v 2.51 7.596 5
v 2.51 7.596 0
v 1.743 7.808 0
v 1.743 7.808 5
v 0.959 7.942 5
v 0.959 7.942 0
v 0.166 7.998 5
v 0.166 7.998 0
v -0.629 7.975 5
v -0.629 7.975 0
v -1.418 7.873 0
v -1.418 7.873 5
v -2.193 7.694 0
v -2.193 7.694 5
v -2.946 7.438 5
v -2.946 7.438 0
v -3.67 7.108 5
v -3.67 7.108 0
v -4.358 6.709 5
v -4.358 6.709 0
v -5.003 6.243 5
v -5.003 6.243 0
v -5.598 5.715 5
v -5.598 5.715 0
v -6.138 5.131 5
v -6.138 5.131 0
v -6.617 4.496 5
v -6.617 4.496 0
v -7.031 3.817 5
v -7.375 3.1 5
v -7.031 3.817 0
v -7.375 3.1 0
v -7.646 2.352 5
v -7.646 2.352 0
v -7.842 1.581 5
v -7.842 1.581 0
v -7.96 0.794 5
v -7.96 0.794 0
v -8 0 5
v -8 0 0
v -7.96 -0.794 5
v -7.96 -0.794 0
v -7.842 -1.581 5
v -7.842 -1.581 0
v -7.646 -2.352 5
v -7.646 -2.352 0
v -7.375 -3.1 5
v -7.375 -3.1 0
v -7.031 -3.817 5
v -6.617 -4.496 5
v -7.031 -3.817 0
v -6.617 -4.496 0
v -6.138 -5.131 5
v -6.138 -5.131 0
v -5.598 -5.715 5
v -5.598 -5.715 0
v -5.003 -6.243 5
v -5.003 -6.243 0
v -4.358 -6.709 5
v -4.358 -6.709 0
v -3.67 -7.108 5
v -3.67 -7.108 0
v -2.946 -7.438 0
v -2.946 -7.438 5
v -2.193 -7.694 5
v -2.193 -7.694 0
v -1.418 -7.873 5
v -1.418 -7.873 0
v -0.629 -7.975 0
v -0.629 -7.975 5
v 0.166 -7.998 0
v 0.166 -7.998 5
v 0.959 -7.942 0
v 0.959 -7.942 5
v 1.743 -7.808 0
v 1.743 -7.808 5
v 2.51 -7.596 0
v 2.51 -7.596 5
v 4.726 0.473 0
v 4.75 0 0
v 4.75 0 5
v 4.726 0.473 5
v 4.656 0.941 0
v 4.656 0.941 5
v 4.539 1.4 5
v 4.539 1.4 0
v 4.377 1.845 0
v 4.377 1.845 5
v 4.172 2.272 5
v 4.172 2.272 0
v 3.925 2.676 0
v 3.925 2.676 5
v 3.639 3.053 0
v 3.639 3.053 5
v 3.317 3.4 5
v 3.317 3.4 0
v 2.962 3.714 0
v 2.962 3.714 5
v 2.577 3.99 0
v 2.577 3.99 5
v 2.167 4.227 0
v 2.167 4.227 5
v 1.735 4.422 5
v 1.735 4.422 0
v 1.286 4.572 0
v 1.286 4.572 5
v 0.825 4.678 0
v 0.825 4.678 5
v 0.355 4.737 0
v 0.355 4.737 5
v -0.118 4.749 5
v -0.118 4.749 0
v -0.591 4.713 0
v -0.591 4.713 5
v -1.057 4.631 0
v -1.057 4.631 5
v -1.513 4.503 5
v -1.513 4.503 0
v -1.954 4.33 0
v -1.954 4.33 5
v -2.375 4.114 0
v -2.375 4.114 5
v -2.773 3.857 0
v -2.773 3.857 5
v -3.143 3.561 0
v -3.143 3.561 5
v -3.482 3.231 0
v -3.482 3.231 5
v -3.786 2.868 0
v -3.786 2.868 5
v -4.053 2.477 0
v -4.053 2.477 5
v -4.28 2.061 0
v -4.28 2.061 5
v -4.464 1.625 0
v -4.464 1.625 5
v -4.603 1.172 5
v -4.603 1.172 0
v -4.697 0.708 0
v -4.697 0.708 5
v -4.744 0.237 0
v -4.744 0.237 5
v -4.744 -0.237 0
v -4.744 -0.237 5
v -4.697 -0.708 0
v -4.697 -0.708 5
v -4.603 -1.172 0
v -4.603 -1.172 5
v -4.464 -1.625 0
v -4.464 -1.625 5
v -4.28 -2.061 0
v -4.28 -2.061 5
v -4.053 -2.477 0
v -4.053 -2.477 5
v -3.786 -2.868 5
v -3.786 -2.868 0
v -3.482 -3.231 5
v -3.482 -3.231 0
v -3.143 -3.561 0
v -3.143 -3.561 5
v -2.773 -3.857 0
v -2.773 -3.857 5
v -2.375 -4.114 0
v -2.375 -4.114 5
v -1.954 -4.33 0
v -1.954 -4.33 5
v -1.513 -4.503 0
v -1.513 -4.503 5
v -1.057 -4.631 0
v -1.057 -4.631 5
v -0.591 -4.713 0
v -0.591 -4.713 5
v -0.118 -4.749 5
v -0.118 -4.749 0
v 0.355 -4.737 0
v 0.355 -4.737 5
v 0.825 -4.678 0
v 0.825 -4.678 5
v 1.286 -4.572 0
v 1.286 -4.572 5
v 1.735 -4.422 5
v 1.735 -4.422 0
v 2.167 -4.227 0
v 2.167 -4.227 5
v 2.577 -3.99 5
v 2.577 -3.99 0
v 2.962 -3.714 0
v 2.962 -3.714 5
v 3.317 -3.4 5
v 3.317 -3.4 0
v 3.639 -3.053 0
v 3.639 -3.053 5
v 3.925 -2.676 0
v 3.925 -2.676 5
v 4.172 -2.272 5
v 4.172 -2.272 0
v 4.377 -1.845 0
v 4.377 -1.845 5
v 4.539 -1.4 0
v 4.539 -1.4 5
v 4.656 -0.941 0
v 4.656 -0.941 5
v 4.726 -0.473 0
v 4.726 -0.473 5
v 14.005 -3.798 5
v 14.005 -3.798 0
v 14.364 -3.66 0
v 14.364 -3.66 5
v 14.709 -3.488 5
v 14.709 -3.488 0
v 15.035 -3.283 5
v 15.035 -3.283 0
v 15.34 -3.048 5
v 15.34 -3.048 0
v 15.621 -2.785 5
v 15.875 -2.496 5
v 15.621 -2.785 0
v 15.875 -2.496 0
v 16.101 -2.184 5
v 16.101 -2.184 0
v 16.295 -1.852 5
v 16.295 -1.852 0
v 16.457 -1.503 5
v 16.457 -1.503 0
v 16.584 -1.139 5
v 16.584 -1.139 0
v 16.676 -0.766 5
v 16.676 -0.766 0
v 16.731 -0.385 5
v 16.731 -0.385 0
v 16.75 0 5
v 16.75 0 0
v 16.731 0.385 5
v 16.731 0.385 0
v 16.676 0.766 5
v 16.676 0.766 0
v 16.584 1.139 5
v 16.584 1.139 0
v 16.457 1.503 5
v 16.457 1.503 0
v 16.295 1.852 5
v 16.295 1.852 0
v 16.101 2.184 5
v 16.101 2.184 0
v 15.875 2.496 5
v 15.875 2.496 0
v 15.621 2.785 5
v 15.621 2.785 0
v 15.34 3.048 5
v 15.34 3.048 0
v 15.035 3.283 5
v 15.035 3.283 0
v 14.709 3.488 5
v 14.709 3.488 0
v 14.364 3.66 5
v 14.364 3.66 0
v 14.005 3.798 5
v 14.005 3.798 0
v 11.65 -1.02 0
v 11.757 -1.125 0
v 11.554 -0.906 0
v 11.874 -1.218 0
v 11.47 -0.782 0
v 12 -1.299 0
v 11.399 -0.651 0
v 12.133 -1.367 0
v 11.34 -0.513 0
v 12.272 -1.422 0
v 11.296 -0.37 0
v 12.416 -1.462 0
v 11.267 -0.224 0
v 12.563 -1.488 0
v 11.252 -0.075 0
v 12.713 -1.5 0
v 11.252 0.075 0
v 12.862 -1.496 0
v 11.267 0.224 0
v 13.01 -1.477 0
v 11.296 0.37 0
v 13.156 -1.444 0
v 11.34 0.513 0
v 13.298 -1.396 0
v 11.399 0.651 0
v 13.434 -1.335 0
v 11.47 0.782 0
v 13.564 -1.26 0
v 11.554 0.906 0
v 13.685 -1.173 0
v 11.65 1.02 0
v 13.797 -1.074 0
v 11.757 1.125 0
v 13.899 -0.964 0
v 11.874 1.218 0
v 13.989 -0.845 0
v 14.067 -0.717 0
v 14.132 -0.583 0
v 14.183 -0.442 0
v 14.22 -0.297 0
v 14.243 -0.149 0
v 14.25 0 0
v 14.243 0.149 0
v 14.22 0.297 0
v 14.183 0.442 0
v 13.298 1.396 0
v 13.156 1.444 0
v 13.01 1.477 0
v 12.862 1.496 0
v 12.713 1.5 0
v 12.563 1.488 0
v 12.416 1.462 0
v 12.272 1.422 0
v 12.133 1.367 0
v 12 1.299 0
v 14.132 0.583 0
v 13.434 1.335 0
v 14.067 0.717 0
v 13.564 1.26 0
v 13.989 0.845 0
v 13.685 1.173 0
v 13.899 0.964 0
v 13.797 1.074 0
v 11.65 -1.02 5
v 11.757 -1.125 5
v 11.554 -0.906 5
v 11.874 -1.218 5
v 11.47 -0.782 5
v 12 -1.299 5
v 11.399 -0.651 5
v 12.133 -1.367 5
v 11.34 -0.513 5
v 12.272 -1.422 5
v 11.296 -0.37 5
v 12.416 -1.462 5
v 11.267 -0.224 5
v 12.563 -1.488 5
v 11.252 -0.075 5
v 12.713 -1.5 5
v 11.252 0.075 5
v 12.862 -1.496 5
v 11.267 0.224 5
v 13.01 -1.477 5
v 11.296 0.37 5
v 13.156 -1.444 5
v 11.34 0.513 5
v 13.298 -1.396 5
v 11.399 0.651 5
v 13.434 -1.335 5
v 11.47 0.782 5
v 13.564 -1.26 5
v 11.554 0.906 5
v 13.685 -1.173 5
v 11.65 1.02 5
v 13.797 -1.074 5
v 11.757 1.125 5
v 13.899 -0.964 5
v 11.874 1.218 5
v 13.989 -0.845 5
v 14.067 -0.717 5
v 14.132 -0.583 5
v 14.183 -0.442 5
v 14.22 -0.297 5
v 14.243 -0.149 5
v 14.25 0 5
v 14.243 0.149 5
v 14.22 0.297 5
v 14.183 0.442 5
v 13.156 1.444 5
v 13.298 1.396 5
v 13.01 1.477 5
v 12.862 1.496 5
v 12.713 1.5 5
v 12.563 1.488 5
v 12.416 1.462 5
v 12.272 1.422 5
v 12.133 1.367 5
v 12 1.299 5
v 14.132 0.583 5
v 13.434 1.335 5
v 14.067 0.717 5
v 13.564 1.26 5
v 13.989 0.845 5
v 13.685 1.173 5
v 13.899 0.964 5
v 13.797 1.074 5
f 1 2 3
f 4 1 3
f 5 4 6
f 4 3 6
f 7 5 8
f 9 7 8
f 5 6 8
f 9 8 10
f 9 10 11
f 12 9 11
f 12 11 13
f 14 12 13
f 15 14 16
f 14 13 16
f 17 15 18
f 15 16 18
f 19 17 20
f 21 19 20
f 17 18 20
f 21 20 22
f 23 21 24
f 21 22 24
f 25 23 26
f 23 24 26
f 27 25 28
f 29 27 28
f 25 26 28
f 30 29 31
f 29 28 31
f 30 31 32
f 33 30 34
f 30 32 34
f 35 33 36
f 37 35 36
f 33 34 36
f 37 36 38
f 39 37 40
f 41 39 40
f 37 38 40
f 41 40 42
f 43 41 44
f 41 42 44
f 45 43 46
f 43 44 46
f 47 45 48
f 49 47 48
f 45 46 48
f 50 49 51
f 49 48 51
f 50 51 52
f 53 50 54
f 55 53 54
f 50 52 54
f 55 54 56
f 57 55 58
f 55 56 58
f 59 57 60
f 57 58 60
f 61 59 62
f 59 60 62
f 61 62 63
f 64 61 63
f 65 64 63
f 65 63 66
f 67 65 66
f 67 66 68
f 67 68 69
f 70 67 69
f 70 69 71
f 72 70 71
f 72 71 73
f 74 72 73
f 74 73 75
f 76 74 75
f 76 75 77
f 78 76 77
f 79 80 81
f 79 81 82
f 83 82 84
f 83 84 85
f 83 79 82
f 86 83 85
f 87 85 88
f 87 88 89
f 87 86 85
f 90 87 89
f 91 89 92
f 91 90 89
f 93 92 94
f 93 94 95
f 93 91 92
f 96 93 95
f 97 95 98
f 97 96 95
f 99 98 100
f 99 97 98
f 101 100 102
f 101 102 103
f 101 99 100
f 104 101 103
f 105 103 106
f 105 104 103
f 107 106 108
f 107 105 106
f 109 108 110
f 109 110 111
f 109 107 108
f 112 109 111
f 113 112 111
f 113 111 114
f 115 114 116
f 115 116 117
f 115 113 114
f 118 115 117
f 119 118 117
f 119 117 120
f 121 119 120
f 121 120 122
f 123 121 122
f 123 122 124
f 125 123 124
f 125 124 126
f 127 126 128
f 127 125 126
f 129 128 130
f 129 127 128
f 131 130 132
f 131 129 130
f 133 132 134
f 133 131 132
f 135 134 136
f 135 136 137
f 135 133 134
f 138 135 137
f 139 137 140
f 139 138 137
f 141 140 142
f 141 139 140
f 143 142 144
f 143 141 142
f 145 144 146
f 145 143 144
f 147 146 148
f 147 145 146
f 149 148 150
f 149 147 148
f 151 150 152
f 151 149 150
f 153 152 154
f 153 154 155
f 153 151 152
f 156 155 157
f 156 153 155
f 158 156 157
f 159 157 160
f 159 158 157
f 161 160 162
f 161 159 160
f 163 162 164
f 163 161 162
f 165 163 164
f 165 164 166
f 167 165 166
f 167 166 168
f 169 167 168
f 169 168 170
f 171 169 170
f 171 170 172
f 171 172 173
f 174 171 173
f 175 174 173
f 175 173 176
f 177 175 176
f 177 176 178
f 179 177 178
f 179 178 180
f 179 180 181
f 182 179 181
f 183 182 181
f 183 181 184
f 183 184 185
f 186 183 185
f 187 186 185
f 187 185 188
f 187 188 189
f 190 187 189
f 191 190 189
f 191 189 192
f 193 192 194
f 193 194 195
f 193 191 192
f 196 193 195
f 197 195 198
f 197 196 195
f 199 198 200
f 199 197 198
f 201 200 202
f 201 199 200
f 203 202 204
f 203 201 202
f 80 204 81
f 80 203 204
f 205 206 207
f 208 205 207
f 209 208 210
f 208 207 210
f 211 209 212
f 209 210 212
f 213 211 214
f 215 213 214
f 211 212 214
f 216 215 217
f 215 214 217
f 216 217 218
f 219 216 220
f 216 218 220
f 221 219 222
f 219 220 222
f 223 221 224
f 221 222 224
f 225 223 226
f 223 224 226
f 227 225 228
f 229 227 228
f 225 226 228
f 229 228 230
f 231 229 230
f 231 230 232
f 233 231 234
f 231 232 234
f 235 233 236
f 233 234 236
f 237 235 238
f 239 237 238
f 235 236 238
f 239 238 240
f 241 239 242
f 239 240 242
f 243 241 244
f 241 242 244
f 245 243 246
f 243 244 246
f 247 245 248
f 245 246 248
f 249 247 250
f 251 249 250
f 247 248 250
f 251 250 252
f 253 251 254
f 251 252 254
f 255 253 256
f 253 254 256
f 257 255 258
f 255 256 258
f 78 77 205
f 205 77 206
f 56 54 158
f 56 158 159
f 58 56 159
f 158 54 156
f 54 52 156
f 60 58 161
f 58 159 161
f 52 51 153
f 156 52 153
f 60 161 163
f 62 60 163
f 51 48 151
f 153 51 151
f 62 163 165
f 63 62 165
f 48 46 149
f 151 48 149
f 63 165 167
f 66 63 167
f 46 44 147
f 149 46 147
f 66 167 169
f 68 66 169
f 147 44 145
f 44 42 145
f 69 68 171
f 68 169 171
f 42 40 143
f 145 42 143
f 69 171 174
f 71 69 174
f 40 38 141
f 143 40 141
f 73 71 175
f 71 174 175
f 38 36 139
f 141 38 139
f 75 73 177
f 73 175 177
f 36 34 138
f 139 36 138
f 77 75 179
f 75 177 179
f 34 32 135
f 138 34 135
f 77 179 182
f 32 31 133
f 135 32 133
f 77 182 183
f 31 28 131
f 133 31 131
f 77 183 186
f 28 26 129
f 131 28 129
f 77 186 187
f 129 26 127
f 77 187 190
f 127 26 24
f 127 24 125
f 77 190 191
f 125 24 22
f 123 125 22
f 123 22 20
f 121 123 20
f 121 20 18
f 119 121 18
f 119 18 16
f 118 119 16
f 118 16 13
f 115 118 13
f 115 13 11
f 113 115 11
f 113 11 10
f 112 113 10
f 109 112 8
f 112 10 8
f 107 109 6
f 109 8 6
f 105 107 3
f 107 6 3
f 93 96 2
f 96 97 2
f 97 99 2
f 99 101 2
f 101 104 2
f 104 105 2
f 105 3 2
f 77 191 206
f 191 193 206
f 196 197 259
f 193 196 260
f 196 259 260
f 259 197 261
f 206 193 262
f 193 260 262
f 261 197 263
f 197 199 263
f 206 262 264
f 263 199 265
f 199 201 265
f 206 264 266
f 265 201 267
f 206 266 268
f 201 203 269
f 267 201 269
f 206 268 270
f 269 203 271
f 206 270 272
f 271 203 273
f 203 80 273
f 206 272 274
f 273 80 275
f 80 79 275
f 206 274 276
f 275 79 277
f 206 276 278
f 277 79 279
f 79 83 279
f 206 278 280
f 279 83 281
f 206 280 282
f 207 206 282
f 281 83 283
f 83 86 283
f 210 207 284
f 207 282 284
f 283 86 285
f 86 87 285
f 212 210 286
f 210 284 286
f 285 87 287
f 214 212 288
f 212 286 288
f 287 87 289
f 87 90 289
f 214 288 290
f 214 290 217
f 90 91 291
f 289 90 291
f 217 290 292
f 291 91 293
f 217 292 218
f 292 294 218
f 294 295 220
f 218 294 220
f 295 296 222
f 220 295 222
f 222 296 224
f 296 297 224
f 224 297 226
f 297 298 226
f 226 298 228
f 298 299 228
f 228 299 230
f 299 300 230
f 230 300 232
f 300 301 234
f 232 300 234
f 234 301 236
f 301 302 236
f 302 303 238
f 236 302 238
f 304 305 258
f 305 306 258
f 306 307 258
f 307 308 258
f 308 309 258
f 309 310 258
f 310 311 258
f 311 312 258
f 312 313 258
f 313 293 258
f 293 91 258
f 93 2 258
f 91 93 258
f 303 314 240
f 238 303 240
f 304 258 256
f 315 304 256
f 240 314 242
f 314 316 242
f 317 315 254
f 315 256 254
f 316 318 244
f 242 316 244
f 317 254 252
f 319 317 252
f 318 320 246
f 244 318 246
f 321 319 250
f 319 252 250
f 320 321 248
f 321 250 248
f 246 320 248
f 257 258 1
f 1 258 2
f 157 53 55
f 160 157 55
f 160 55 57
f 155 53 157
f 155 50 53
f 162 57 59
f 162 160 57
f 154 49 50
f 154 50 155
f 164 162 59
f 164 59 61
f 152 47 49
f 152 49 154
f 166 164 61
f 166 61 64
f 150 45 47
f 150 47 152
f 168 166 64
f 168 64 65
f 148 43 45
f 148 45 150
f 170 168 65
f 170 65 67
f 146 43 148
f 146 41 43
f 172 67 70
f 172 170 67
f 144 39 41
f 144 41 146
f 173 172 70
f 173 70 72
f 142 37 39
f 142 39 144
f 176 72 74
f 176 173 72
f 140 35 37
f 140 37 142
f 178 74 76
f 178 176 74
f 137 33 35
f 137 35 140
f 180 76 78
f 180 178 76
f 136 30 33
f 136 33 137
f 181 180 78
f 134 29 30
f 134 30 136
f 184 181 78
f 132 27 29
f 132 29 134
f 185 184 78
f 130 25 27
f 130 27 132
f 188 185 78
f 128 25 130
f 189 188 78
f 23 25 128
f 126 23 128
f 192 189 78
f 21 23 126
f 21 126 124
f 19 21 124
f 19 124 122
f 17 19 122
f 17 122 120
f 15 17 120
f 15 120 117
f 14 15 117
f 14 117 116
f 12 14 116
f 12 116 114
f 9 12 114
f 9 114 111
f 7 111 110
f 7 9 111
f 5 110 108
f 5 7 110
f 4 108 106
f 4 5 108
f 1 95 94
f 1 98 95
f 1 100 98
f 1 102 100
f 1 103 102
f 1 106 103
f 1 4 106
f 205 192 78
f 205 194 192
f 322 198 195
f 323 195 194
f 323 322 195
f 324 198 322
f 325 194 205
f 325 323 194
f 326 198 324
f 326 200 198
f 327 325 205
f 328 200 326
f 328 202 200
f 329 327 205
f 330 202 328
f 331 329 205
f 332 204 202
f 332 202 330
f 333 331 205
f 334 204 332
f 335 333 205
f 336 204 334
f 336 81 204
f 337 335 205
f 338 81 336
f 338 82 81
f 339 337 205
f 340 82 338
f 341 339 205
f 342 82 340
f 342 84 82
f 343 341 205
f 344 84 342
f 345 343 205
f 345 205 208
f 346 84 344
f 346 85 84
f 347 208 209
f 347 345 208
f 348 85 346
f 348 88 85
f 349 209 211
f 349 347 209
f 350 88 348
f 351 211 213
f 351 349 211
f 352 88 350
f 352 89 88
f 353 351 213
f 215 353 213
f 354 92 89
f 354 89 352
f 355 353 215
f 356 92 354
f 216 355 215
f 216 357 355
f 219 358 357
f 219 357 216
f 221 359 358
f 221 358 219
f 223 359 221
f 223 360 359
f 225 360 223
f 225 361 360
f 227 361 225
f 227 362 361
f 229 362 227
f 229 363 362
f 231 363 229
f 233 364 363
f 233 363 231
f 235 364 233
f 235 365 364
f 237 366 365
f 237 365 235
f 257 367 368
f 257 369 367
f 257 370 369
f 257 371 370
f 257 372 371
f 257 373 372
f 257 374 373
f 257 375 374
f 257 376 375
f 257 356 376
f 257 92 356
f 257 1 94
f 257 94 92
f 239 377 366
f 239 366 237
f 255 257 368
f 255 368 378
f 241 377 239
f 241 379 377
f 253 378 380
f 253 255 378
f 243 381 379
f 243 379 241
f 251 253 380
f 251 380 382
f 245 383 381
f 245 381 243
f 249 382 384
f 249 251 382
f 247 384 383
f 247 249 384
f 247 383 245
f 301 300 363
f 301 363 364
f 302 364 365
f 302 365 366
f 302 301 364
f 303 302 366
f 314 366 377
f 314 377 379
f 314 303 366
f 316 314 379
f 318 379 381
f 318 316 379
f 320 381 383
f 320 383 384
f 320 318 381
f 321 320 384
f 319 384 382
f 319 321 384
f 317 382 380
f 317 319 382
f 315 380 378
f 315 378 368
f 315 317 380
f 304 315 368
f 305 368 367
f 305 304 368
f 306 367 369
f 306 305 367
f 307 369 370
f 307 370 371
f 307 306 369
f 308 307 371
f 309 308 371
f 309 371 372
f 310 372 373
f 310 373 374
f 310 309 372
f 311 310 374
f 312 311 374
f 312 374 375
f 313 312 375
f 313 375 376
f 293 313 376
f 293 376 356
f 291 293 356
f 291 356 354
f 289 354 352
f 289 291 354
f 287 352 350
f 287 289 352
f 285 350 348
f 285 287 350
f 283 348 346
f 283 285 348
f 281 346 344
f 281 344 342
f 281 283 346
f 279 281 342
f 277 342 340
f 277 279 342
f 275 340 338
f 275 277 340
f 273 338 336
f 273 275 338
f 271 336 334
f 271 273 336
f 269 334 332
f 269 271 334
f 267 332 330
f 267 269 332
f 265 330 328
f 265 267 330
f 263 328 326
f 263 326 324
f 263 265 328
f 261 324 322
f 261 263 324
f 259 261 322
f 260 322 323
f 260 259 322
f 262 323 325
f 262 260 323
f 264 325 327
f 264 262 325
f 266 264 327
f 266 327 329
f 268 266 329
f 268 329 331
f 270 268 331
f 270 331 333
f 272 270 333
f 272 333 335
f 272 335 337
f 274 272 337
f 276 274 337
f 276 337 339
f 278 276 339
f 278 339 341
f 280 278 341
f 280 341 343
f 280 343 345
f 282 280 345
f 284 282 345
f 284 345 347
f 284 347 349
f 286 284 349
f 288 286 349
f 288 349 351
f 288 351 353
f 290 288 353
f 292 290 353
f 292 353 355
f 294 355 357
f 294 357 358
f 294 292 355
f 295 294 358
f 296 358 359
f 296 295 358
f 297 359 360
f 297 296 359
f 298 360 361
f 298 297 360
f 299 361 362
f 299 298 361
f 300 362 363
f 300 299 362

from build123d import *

# Parameters (mm, degrees)
F0_R     = 4.75
F0_R_2   = 1.5
F1_DEPTH = 5


with BuildPart() as f1:
    # F0 (on Top) → F1 (new body)
    with BuildSketch(Plane.XY):
        with BuildLine():
            ThreePointArc((8, 0), (6.483766, 4.686233), (2.509804, 7.59611))
            ThreePointArc((2.509804, 7.59611), (-8, 0), (2.509804, -7.59611))
            ThreePointArc((2.509804, -7.59611), (6.483766, -4.686233), (8, 0))
        make_face()
        Circle(F0_R, mode=Mode.SUBTRACT)
        with BuildLine():
            ThreePointArc((14.004902, -3.798055), (16.75, 0), (14.004902, 3.798055))
            Line((14.004902, 3.798055), (2.509804, 7.59611))
            ThreePointArc((2.509804, 7.59611), (6.483766, 4.686233), (8, 0))
            ThreePointArc((8, 0), (6.483766, -4.686233), (2.509804, -7.59611))
            Line((2.509804, -7.59611), (14.004902, -3.798055))
        make_face()
        with Locations((12.75, 0)):
            Circle(F0_R_2, mode=Mode.SUBTRACT)
    extrude(amount=F1_DEPTH)


solid = f1.part
